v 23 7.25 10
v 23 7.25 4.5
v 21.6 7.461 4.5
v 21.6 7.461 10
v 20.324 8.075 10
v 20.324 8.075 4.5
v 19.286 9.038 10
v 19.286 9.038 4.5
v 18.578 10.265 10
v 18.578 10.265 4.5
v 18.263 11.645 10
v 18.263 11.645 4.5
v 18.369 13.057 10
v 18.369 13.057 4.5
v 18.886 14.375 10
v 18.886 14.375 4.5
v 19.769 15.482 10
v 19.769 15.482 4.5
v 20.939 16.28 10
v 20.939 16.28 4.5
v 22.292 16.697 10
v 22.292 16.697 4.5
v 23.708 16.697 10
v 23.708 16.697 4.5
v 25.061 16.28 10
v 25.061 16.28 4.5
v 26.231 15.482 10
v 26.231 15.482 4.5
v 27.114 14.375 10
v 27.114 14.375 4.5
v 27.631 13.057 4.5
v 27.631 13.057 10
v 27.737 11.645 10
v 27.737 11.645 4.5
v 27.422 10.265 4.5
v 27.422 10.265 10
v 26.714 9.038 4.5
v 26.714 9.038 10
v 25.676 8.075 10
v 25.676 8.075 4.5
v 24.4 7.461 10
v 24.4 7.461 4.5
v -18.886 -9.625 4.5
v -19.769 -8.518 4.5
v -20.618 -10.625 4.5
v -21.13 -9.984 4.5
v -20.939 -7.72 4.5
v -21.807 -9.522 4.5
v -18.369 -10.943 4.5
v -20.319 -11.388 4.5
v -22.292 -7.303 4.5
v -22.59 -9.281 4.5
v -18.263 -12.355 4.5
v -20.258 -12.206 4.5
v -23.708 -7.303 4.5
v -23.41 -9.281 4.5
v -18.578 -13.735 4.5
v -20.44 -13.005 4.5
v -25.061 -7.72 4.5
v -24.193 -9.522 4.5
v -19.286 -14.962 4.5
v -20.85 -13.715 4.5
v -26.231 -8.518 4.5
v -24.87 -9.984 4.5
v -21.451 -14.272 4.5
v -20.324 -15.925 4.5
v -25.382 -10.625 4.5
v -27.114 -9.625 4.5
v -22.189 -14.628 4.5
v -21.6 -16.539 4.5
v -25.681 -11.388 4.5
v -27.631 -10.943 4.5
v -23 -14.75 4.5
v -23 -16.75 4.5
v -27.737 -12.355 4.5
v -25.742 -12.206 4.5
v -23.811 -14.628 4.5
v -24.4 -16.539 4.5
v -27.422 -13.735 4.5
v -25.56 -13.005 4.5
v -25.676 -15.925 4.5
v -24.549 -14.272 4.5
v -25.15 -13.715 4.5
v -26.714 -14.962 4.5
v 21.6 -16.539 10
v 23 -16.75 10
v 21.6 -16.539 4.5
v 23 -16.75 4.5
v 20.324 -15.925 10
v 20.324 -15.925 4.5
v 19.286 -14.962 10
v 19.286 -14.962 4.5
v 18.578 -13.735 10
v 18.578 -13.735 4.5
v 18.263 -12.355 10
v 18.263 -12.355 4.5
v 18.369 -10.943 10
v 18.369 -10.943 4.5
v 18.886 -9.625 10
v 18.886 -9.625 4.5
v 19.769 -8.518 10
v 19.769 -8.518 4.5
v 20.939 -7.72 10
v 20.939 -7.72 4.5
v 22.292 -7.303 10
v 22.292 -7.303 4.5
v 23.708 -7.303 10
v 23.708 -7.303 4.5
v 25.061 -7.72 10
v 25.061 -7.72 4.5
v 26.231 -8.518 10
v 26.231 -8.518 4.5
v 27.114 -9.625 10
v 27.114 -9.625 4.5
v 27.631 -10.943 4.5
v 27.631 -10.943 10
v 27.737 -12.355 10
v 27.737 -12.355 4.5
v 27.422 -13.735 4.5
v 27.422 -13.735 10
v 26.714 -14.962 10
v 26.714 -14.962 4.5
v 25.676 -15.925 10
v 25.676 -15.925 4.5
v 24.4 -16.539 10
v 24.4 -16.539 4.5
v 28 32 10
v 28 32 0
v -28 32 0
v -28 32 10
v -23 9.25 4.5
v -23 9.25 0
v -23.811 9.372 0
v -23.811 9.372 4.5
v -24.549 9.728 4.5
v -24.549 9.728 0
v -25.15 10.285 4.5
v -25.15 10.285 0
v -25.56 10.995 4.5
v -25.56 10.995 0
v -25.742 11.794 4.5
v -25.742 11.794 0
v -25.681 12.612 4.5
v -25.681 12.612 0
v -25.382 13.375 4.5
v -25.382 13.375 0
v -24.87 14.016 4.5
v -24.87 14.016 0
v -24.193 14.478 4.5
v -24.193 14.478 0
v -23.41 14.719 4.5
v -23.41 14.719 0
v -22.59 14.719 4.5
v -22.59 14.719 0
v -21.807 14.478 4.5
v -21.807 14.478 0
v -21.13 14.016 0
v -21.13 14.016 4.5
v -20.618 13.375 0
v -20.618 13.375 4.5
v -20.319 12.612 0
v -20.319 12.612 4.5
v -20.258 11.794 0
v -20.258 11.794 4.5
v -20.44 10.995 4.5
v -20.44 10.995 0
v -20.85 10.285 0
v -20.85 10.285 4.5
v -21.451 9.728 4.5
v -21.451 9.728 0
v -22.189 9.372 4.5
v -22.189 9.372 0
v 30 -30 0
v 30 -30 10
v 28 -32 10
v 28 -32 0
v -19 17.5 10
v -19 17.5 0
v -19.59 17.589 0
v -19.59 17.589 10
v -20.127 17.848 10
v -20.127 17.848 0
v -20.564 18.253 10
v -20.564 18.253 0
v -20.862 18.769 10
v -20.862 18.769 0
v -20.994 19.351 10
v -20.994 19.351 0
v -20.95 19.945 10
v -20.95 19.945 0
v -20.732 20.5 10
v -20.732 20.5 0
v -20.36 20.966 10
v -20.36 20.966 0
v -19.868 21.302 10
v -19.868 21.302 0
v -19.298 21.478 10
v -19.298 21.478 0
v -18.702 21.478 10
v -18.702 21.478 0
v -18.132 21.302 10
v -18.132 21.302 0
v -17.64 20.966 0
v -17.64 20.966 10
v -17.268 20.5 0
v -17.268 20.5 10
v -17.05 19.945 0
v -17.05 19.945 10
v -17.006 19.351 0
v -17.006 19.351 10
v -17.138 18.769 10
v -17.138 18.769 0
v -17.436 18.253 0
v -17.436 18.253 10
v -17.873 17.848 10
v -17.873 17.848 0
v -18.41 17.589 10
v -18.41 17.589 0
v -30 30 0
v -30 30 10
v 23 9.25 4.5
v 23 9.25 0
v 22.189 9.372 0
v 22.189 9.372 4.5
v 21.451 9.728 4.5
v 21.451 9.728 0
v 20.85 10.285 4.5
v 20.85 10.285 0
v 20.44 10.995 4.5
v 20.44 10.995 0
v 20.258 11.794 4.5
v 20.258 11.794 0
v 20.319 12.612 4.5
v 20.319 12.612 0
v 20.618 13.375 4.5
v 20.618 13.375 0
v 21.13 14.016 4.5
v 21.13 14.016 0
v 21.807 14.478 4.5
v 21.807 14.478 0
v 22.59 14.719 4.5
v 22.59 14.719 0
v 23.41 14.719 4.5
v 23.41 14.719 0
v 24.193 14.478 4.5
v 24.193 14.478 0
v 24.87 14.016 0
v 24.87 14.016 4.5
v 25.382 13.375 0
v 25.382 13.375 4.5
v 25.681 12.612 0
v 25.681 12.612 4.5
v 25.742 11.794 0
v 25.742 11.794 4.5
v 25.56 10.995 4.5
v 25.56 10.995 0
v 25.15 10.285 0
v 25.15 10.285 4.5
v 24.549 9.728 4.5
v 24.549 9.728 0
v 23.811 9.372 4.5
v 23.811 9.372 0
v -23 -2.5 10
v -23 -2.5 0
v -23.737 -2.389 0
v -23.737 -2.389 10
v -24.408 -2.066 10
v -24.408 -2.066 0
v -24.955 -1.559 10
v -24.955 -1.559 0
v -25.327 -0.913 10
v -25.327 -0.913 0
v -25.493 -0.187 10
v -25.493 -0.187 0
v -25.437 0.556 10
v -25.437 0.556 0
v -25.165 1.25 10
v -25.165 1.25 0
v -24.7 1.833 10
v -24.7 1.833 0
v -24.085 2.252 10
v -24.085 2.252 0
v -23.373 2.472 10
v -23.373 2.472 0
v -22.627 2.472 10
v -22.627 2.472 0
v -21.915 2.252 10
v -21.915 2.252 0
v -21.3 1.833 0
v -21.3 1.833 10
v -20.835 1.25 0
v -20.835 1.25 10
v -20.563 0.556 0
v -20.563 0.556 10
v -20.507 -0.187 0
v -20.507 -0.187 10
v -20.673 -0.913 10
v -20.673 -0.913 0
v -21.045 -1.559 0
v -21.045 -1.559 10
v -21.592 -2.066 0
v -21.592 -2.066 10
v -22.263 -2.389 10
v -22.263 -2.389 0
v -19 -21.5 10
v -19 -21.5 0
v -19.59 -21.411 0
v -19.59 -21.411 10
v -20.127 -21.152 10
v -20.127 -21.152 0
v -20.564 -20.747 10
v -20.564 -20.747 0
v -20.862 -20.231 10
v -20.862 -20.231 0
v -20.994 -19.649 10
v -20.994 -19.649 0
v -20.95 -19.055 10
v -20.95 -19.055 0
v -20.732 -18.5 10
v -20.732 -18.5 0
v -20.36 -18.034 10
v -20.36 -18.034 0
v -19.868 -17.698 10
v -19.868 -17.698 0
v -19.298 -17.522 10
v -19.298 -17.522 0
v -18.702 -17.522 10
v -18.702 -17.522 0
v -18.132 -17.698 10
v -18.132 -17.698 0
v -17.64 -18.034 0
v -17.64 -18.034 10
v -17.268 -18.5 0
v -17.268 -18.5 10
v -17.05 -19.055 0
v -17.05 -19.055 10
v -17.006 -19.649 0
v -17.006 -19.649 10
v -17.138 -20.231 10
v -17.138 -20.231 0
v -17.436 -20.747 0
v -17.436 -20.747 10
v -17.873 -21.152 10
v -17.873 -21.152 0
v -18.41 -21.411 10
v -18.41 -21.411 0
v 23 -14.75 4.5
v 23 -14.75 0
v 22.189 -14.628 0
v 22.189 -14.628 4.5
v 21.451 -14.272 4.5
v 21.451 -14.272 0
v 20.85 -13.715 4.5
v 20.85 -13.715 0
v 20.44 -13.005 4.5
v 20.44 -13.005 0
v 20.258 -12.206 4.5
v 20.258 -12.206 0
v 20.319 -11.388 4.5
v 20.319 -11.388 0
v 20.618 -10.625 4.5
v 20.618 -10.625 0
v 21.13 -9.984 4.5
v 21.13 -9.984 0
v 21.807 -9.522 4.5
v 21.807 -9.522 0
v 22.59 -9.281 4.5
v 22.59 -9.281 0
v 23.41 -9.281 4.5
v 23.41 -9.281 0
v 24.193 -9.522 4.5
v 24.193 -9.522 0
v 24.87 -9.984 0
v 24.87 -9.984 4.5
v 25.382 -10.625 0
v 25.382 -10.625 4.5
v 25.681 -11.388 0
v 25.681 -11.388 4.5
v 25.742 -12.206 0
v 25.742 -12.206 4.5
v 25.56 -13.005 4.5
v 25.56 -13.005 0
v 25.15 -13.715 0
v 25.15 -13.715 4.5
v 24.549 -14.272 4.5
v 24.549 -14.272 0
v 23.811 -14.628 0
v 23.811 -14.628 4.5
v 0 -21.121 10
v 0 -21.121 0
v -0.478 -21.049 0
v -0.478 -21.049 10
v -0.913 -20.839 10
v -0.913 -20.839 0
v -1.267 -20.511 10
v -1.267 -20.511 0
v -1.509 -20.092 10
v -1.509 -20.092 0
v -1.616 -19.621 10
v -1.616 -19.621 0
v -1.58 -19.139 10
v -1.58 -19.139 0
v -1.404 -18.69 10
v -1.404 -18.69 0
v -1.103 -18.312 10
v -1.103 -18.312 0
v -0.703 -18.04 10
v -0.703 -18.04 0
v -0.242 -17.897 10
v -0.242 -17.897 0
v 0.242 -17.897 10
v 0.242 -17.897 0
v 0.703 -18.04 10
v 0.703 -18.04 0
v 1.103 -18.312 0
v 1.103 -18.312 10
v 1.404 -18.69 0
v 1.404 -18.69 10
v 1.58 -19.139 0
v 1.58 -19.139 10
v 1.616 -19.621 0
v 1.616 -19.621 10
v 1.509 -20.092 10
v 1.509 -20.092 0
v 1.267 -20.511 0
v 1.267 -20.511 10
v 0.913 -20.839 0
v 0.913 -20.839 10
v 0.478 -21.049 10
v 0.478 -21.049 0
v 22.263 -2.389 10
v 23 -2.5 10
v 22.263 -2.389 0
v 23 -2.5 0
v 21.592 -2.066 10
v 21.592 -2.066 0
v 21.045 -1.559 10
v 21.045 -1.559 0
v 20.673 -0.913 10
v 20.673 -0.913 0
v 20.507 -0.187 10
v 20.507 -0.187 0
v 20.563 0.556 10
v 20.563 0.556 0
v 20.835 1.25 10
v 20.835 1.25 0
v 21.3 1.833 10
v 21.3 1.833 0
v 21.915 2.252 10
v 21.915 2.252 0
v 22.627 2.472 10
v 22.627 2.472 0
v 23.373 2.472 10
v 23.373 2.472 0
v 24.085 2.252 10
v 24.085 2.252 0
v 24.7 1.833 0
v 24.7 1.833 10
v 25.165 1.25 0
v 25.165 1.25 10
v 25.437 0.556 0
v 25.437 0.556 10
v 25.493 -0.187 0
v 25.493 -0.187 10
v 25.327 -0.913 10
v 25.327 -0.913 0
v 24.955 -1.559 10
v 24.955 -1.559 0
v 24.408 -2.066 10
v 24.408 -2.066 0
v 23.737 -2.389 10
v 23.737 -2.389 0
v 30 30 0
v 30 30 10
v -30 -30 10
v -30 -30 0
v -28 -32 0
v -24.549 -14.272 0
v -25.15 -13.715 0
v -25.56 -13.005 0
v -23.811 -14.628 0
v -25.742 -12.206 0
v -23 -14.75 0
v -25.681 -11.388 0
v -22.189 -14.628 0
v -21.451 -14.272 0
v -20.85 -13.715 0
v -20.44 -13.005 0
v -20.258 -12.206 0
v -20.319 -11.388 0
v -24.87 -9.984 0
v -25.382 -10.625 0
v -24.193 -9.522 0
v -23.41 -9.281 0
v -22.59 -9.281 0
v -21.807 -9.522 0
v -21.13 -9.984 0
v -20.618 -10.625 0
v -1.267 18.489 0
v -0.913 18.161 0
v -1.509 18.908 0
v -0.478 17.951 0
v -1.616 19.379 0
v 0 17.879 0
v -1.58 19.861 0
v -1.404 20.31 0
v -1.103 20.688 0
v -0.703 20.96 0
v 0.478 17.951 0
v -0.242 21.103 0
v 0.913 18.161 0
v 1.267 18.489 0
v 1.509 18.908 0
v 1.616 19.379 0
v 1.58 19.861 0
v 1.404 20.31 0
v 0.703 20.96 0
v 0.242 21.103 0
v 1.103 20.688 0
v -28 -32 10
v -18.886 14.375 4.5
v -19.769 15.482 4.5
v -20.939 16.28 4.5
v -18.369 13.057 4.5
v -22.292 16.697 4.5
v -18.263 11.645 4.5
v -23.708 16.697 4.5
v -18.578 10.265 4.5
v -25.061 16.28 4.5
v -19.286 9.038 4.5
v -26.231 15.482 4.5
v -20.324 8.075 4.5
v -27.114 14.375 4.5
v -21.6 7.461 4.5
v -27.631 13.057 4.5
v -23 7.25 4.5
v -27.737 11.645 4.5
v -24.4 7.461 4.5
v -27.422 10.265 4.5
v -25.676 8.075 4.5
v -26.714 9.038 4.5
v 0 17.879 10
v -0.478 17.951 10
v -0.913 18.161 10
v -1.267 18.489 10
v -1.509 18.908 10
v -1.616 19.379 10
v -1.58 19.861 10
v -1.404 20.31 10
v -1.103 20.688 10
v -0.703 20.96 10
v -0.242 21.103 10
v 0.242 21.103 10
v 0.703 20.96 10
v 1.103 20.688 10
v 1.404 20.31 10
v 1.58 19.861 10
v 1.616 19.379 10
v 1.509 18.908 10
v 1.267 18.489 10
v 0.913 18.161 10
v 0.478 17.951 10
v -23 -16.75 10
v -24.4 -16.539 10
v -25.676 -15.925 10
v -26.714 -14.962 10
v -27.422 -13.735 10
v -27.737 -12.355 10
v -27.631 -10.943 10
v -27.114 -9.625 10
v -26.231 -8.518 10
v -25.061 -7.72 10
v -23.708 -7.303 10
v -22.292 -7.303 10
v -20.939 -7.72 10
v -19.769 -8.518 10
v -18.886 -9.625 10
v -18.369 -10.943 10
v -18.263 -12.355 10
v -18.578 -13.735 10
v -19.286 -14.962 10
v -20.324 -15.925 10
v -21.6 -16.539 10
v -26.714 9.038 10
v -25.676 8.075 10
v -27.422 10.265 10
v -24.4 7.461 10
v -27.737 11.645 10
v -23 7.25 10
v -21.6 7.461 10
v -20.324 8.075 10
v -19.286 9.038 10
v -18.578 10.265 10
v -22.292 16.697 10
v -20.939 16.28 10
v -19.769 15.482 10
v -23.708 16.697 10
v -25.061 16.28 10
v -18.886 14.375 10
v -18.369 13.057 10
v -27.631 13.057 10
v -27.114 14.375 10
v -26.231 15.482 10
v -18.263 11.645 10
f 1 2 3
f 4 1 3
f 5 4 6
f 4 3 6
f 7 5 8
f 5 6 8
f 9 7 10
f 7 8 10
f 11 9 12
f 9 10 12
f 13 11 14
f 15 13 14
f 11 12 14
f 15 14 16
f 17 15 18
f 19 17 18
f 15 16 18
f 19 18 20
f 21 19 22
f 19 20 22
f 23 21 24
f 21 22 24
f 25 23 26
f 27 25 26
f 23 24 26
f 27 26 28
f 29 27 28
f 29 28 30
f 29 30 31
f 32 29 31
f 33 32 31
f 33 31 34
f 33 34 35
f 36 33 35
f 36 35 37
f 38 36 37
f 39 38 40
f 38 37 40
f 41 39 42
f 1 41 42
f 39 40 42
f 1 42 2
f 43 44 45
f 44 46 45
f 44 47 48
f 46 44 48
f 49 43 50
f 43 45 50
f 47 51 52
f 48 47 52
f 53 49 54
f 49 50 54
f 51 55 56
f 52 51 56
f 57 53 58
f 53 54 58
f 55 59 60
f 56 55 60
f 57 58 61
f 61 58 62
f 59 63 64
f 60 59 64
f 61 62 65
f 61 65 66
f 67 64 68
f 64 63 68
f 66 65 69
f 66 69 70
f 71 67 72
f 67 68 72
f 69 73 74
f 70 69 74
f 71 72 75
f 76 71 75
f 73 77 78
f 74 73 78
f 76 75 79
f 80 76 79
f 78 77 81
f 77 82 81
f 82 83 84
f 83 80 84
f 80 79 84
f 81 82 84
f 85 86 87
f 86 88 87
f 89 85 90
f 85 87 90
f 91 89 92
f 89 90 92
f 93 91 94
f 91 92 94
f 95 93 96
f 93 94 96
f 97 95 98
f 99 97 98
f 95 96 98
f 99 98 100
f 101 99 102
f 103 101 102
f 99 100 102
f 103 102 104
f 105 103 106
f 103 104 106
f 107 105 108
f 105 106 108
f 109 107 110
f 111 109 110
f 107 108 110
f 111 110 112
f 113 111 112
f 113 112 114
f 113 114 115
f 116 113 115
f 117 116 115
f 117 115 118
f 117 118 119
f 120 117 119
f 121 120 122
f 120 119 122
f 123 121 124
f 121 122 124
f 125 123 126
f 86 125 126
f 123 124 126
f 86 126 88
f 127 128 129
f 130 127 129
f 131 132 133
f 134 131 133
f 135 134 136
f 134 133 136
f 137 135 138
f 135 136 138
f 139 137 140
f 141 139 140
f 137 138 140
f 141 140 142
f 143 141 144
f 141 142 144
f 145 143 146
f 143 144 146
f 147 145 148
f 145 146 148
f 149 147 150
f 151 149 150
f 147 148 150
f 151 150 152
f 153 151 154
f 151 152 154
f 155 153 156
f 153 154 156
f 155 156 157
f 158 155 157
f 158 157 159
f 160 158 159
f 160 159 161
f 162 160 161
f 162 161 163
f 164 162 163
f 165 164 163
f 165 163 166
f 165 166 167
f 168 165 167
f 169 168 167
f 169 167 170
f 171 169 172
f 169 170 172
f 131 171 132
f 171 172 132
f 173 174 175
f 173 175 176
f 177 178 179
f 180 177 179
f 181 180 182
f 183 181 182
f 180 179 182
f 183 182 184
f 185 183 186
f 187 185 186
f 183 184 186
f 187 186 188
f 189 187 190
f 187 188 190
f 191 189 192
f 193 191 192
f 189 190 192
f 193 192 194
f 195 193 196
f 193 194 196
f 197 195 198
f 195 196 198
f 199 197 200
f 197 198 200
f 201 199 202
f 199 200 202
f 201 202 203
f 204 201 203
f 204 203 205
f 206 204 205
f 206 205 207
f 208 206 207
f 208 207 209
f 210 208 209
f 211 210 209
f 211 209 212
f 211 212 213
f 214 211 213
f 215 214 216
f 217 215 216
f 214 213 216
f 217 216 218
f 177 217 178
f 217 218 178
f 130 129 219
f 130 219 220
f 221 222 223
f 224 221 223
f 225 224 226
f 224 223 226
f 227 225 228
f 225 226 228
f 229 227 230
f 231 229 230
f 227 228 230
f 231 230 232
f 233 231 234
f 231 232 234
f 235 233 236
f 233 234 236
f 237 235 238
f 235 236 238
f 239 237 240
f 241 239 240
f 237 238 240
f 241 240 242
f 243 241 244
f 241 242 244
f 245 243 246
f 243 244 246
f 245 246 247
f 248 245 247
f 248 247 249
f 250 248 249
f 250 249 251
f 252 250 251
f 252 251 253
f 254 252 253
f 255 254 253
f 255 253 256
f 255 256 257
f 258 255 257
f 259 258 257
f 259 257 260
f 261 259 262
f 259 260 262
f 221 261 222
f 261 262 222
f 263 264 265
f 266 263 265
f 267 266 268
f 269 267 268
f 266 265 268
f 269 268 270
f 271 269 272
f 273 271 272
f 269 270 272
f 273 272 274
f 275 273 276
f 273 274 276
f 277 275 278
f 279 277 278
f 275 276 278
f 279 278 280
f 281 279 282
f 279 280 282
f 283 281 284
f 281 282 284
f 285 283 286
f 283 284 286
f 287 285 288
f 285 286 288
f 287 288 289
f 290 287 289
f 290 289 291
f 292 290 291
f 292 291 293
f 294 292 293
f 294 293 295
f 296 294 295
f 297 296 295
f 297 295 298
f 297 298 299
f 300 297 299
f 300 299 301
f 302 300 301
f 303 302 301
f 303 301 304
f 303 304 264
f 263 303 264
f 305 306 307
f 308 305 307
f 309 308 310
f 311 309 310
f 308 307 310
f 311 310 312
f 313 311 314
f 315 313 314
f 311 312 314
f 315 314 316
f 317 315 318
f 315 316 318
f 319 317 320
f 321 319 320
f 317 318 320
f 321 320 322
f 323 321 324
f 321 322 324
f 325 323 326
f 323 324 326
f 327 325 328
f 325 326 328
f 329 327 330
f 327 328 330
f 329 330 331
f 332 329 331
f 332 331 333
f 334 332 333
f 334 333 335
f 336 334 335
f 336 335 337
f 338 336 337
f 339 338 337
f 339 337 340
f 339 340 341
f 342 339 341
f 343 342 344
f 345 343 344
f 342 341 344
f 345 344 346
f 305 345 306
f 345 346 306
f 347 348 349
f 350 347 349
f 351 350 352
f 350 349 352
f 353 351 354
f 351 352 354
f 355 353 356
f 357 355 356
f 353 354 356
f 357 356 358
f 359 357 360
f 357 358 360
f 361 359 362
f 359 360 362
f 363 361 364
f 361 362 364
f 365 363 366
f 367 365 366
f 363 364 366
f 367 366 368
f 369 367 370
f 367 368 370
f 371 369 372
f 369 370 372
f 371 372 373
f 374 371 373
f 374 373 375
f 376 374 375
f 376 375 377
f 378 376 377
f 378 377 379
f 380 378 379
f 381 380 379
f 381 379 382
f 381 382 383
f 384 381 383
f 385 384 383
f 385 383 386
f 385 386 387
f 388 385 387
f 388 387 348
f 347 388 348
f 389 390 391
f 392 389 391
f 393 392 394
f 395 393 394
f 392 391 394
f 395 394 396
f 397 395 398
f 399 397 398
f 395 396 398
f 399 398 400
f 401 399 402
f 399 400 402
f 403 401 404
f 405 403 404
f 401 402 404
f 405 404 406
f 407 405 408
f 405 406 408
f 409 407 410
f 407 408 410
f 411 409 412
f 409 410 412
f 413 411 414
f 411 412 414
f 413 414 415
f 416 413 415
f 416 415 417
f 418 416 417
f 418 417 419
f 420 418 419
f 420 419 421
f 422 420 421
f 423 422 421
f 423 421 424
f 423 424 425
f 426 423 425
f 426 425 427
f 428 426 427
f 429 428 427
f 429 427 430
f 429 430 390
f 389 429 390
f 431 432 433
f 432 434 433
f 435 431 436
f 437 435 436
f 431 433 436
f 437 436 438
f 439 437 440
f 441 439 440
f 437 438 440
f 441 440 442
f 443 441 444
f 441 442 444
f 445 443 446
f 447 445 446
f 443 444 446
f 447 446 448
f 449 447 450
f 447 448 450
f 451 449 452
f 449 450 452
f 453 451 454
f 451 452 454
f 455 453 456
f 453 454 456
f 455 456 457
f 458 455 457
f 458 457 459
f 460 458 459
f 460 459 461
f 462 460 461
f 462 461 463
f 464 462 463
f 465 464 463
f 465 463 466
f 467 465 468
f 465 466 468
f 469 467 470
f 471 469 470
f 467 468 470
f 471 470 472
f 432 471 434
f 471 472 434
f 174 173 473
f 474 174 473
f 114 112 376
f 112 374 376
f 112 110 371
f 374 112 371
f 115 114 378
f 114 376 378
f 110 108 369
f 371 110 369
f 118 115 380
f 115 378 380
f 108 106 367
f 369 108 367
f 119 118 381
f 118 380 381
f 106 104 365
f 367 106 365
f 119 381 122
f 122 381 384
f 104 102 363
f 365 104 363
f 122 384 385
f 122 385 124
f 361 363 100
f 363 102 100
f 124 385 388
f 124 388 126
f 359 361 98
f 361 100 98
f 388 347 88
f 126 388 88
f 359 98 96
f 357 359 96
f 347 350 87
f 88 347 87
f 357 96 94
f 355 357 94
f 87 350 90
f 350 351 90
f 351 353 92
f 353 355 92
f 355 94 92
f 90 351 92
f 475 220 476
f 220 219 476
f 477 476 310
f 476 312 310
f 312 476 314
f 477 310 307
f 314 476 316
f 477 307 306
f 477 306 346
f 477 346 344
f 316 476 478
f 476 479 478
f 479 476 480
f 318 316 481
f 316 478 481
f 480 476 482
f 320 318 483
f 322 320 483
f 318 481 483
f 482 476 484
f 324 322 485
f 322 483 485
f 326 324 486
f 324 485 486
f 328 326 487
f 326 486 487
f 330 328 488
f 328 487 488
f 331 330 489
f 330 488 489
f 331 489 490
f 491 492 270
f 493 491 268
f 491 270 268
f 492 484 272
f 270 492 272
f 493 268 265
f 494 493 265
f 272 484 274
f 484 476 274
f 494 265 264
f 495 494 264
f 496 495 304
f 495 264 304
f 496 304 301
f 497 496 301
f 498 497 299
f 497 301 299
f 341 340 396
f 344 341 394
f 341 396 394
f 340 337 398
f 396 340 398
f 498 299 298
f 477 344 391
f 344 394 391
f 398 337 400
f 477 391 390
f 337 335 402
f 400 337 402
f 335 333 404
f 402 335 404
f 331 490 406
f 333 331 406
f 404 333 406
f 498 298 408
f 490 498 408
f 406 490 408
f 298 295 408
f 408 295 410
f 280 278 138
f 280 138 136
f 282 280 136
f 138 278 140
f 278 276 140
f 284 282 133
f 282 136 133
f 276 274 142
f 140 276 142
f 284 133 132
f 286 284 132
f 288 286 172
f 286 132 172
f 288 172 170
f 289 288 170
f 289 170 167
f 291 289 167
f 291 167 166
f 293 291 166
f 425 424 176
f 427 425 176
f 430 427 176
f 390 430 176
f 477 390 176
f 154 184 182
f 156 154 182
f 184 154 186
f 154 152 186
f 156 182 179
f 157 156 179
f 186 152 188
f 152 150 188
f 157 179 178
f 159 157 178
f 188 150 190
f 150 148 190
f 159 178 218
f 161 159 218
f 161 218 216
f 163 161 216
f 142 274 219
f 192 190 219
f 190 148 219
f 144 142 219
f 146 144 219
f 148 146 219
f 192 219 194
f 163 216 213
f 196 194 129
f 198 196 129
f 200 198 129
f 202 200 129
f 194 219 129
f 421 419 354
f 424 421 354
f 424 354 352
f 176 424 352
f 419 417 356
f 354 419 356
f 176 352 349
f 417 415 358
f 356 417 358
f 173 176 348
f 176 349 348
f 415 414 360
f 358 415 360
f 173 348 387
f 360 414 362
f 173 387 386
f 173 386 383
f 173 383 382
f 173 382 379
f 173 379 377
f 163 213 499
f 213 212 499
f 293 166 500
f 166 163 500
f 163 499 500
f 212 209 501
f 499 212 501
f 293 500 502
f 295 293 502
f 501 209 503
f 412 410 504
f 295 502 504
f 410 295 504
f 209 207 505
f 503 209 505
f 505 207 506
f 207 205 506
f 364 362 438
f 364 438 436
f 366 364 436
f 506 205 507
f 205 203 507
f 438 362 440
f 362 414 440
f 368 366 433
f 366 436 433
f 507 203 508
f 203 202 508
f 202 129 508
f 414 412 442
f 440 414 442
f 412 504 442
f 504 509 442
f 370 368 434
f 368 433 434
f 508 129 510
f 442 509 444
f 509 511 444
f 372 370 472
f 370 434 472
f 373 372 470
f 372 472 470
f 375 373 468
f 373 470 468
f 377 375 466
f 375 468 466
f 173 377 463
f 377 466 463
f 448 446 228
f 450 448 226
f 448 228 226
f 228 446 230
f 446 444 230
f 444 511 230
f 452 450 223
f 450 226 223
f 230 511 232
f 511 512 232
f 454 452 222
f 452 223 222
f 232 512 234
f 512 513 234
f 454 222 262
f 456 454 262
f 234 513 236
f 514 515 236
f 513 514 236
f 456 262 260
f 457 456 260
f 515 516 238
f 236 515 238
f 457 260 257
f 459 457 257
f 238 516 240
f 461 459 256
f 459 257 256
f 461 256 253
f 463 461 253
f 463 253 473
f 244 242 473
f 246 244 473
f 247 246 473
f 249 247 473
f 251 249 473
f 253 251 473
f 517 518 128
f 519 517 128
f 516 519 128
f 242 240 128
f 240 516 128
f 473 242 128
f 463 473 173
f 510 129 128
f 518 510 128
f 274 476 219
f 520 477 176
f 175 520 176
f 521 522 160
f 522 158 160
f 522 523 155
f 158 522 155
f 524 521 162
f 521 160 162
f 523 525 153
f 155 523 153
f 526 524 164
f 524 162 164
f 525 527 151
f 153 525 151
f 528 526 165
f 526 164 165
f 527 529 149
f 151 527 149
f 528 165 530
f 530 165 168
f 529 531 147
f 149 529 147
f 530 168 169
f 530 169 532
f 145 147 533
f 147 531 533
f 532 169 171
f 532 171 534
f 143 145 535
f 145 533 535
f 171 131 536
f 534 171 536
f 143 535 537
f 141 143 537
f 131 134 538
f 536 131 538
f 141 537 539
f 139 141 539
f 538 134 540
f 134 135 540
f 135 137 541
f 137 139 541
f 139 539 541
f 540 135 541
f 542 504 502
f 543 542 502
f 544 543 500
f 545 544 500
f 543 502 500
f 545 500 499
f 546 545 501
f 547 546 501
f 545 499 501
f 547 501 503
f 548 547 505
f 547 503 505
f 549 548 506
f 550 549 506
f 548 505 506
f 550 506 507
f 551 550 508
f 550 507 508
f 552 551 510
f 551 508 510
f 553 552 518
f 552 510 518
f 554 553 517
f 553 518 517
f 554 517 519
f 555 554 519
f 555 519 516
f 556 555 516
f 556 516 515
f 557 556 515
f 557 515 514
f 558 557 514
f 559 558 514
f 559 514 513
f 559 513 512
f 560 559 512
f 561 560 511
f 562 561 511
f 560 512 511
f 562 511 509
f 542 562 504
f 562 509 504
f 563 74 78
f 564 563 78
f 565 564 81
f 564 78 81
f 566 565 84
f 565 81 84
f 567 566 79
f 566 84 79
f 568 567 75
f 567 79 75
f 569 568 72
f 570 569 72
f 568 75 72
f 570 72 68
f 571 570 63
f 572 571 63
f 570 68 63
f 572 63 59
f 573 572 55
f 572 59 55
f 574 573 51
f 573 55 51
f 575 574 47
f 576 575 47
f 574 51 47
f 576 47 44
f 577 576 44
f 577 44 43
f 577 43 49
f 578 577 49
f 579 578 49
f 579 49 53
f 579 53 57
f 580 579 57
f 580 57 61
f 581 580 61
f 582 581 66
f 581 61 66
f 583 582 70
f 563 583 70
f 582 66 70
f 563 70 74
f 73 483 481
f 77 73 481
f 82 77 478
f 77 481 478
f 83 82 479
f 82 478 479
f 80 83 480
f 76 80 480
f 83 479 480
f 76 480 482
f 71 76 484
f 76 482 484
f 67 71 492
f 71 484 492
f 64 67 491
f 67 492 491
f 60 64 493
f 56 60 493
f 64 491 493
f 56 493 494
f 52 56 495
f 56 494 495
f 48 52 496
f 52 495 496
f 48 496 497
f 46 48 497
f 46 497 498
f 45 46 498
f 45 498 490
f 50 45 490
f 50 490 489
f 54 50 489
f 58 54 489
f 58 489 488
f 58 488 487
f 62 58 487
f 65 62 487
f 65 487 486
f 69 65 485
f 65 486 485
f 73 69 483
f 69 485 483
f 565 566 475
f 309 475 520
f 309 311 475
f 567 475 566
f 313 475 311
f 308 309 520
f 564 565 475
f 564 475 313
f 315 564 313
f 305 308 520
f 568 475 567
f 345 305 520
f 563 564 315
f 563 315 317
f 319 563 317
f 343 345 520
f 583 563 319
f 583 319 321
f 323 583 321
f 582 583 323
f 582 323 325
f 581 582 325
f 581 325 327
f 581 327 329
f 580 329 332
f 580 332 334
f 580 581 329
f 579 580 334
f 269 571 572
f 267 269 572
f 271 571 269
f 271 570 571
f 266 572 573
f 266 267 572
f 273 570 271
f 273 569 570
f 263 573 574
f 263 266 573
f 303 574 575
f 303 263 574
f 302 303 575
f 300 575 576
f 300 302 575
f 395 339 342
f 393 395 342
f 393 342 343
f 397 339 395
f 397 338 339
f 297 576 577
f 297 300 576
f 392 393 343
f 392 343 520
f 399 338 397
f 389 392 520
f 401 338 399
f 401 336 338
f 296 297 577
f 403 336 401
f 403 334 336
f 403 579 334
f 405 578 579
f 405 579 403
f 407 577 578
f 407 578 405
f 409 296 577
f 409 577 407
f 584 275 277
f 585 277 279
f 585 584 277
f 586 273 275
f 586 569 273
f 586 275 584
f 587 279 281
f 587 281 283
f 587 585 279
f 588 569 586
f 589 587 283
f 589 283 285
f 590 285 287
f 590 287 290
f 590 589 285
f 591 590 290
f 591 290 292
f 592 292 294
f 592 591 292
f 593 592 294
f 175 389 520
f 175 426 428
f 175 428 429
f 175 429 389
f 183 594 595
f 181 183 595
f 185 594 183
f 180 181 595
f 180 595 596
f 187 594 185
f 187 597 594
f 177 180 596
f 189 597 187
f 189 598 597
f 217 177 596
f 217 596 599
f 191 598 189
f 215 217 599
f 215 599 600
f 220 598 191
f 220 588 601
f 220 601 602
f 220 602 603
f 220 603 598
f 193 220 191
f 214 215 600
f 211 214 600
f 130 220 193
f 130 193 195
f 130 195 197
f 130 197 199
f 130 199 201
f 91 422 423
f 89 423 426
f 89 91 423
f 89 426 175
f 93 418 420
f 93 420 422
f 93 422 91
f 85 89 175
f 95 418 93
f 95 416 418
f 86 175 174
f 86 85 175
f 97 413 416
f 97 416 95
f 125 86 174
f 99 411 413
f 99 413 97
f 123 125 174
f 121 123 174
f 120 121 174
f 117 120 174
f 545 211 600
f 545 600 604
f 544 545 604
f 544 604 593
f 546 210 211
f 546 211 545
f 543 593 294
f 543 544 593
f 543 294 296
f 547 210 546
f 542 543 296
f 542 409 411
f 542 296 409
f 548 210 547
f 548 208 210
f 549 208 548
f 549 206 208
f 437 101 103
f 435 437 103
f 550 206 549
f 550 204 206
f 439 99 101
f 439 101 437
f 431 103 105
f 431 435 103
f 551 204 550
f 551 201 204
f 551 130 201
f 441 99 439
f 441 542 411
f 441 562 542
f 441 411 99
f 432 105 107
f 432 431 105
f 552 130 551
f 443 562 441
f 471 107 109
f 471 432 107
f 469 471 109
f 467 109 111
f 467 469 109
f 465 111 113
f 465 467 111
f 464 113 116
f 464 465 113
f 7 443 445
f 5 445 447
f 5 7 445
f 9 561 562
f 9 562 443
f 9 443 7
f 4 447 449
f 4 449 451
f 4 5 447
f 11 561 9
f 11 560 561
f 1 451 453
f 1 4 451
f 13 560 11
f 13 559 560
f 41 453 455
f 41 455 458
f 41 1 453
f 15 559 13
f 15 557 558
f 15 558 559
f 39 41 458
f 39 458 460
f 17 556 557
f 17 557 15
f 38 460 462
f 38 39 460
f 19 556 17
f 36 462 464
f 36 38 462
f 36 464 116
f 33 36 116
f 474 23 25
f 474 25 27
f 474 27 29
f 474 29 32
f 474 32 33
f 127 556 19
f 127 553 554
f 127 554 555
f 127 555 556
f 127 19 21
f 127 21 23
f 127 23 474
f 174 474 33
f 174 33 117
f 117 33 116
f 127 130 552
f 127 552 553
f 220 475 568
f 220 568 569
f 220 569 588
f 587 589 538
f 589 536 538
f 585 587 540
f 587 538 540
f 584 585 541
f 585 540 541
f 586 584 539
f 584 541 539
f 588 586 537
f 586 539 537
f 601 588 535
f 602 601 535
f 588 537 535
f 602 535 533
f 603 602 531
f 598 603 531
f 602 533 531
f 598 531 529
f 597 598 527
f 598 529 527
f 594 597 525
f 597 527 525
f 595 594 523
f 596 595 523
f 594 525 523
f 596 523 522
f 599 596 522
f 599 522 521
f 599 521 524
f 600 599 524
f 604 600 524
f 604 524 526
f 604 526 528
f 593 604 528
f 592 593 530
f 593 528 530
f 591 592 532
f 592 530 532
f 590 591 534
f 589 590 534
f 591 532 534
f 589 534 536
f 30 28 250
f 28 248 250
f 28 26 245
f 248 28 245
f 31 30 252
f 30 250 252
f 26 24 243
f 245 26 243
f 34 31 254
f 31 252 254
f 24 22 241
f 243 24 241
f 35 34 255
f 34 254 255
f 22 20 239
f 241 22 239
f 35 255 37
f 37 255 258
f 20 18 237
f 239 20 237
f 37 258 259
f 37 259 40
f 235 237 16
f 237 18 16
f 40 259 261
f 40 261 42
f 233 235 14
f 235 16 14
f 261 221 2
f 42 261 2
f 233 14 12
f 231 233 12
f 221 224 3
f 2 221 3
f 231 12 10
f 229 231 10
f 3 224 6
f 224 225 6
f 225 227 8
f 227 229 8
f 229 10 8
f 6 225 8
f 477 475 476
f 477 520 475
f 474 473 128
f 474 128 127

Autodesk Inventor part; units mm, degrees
ref_plane "YZ Plane" through (0, 0, 0) normal (1, 0, 0) x (0, 1, 0)
ref_plane "XZ Plane" through (0, 0, 0) normal (0, 1, 0) x (-1, 0, 0)
ref_plane "XY Plane" through (0, 0, 0) normal (0, 0, 1) x (1, 0, 0)
sketch "スケッチ1" plane through (0, 0, 0) normal (0, 0, 1) x (1, 0, 0)
  line L0 (-30, -32) -> (30, -32)
  line L1 (30, -32) -> (30, 32)
  line L2 (30, 32) -> (-30, 32)
  line L3 (-30, 32) -> (-30, -32)
  point P0 (0, 0)
  point P1 (0, -32)
  point P2 (-30, 0)
  dimension "d0" = 60
  dimension "d1" = 64
extrude "押し出し1" add sketch "スケッチ1" along normal blind 10
sketch "スケッチ2" plane through (0, 0, 10) normal (0, 0, 1) x (1, 0, 0)
  point P0 (0, 0)
  point P1 (-23, -12)
  dimension "d4" = 23
  dimension "d5" = 12
hole "穴1" at (-23, -12, 10) direction (0, 0, -1) diameter 5.5 end through all counterbore diameter 9.5 counterbore depth 5.5
pattern_linear "矩形状パターン1" count 2 spacing 24 along (0, 1, 0) count 2 spacing 46 along (1, 0, 0) of "穴1"
sketch "スケッチ3" plane through (0, 0, 10) normal (0, 0, 1) x (1, 0, 0)
  circle A0 centre (23, -12) radius 4.75 projected
  circle A1 centre (-23, -12) radius 4.75 projected
  point P0 (0, 0)
  point P1 (-23, 0)
  point P2 (23, 0)
hole "穴2" at (-23, 0, 10) at (23, 0, 10) direction (0, 0, -1) diameter 5 end through all
sketch "スケッチ4" plane through (0, 0, 10) normal (0, 0, 1) x (1, 0, 0)
  point P0 (0, 0)
  point P1 (0, 19.5)
  point P2 (0, -19.5)
  dimension "d26" = 19.5
  dimension "d27" = 19.5
hole "穴3" at (0, 19.5, 10) at (0, -19.5, 10) direction (0, 0, -1) diameter 3.242 end through all thread size "M4x0.7" class "6H" standard "ANSI Metric M Profile"
sketch "スケッチ5" plane through (0, 0, 10) normal (0, 0, 1) x (1, 0, 0)
  circle A0 centre (0, -19.5) radius 1.621 projected
  circle A1 centre (0, 19.5) radius 1.621 projected
  point P0 (0, 0)
  point P1 (-19, 19.5)
  point P2 (-19, -19.5)
  dimension "d35" = 19
hole "穴4" at (-19, 19.5, 10) at (-19, -19.5, 10) direction (0, 0, -1) diameter 4 end through all
chamfer "面取り1" distance 2 angle 45 4 edges at (30, 32, 5) (30, -32, 5) (-30, -32, 5) (-30, 32, 5)
equation "\"d27\" = d26"
properties part number "03" material "A5052"
